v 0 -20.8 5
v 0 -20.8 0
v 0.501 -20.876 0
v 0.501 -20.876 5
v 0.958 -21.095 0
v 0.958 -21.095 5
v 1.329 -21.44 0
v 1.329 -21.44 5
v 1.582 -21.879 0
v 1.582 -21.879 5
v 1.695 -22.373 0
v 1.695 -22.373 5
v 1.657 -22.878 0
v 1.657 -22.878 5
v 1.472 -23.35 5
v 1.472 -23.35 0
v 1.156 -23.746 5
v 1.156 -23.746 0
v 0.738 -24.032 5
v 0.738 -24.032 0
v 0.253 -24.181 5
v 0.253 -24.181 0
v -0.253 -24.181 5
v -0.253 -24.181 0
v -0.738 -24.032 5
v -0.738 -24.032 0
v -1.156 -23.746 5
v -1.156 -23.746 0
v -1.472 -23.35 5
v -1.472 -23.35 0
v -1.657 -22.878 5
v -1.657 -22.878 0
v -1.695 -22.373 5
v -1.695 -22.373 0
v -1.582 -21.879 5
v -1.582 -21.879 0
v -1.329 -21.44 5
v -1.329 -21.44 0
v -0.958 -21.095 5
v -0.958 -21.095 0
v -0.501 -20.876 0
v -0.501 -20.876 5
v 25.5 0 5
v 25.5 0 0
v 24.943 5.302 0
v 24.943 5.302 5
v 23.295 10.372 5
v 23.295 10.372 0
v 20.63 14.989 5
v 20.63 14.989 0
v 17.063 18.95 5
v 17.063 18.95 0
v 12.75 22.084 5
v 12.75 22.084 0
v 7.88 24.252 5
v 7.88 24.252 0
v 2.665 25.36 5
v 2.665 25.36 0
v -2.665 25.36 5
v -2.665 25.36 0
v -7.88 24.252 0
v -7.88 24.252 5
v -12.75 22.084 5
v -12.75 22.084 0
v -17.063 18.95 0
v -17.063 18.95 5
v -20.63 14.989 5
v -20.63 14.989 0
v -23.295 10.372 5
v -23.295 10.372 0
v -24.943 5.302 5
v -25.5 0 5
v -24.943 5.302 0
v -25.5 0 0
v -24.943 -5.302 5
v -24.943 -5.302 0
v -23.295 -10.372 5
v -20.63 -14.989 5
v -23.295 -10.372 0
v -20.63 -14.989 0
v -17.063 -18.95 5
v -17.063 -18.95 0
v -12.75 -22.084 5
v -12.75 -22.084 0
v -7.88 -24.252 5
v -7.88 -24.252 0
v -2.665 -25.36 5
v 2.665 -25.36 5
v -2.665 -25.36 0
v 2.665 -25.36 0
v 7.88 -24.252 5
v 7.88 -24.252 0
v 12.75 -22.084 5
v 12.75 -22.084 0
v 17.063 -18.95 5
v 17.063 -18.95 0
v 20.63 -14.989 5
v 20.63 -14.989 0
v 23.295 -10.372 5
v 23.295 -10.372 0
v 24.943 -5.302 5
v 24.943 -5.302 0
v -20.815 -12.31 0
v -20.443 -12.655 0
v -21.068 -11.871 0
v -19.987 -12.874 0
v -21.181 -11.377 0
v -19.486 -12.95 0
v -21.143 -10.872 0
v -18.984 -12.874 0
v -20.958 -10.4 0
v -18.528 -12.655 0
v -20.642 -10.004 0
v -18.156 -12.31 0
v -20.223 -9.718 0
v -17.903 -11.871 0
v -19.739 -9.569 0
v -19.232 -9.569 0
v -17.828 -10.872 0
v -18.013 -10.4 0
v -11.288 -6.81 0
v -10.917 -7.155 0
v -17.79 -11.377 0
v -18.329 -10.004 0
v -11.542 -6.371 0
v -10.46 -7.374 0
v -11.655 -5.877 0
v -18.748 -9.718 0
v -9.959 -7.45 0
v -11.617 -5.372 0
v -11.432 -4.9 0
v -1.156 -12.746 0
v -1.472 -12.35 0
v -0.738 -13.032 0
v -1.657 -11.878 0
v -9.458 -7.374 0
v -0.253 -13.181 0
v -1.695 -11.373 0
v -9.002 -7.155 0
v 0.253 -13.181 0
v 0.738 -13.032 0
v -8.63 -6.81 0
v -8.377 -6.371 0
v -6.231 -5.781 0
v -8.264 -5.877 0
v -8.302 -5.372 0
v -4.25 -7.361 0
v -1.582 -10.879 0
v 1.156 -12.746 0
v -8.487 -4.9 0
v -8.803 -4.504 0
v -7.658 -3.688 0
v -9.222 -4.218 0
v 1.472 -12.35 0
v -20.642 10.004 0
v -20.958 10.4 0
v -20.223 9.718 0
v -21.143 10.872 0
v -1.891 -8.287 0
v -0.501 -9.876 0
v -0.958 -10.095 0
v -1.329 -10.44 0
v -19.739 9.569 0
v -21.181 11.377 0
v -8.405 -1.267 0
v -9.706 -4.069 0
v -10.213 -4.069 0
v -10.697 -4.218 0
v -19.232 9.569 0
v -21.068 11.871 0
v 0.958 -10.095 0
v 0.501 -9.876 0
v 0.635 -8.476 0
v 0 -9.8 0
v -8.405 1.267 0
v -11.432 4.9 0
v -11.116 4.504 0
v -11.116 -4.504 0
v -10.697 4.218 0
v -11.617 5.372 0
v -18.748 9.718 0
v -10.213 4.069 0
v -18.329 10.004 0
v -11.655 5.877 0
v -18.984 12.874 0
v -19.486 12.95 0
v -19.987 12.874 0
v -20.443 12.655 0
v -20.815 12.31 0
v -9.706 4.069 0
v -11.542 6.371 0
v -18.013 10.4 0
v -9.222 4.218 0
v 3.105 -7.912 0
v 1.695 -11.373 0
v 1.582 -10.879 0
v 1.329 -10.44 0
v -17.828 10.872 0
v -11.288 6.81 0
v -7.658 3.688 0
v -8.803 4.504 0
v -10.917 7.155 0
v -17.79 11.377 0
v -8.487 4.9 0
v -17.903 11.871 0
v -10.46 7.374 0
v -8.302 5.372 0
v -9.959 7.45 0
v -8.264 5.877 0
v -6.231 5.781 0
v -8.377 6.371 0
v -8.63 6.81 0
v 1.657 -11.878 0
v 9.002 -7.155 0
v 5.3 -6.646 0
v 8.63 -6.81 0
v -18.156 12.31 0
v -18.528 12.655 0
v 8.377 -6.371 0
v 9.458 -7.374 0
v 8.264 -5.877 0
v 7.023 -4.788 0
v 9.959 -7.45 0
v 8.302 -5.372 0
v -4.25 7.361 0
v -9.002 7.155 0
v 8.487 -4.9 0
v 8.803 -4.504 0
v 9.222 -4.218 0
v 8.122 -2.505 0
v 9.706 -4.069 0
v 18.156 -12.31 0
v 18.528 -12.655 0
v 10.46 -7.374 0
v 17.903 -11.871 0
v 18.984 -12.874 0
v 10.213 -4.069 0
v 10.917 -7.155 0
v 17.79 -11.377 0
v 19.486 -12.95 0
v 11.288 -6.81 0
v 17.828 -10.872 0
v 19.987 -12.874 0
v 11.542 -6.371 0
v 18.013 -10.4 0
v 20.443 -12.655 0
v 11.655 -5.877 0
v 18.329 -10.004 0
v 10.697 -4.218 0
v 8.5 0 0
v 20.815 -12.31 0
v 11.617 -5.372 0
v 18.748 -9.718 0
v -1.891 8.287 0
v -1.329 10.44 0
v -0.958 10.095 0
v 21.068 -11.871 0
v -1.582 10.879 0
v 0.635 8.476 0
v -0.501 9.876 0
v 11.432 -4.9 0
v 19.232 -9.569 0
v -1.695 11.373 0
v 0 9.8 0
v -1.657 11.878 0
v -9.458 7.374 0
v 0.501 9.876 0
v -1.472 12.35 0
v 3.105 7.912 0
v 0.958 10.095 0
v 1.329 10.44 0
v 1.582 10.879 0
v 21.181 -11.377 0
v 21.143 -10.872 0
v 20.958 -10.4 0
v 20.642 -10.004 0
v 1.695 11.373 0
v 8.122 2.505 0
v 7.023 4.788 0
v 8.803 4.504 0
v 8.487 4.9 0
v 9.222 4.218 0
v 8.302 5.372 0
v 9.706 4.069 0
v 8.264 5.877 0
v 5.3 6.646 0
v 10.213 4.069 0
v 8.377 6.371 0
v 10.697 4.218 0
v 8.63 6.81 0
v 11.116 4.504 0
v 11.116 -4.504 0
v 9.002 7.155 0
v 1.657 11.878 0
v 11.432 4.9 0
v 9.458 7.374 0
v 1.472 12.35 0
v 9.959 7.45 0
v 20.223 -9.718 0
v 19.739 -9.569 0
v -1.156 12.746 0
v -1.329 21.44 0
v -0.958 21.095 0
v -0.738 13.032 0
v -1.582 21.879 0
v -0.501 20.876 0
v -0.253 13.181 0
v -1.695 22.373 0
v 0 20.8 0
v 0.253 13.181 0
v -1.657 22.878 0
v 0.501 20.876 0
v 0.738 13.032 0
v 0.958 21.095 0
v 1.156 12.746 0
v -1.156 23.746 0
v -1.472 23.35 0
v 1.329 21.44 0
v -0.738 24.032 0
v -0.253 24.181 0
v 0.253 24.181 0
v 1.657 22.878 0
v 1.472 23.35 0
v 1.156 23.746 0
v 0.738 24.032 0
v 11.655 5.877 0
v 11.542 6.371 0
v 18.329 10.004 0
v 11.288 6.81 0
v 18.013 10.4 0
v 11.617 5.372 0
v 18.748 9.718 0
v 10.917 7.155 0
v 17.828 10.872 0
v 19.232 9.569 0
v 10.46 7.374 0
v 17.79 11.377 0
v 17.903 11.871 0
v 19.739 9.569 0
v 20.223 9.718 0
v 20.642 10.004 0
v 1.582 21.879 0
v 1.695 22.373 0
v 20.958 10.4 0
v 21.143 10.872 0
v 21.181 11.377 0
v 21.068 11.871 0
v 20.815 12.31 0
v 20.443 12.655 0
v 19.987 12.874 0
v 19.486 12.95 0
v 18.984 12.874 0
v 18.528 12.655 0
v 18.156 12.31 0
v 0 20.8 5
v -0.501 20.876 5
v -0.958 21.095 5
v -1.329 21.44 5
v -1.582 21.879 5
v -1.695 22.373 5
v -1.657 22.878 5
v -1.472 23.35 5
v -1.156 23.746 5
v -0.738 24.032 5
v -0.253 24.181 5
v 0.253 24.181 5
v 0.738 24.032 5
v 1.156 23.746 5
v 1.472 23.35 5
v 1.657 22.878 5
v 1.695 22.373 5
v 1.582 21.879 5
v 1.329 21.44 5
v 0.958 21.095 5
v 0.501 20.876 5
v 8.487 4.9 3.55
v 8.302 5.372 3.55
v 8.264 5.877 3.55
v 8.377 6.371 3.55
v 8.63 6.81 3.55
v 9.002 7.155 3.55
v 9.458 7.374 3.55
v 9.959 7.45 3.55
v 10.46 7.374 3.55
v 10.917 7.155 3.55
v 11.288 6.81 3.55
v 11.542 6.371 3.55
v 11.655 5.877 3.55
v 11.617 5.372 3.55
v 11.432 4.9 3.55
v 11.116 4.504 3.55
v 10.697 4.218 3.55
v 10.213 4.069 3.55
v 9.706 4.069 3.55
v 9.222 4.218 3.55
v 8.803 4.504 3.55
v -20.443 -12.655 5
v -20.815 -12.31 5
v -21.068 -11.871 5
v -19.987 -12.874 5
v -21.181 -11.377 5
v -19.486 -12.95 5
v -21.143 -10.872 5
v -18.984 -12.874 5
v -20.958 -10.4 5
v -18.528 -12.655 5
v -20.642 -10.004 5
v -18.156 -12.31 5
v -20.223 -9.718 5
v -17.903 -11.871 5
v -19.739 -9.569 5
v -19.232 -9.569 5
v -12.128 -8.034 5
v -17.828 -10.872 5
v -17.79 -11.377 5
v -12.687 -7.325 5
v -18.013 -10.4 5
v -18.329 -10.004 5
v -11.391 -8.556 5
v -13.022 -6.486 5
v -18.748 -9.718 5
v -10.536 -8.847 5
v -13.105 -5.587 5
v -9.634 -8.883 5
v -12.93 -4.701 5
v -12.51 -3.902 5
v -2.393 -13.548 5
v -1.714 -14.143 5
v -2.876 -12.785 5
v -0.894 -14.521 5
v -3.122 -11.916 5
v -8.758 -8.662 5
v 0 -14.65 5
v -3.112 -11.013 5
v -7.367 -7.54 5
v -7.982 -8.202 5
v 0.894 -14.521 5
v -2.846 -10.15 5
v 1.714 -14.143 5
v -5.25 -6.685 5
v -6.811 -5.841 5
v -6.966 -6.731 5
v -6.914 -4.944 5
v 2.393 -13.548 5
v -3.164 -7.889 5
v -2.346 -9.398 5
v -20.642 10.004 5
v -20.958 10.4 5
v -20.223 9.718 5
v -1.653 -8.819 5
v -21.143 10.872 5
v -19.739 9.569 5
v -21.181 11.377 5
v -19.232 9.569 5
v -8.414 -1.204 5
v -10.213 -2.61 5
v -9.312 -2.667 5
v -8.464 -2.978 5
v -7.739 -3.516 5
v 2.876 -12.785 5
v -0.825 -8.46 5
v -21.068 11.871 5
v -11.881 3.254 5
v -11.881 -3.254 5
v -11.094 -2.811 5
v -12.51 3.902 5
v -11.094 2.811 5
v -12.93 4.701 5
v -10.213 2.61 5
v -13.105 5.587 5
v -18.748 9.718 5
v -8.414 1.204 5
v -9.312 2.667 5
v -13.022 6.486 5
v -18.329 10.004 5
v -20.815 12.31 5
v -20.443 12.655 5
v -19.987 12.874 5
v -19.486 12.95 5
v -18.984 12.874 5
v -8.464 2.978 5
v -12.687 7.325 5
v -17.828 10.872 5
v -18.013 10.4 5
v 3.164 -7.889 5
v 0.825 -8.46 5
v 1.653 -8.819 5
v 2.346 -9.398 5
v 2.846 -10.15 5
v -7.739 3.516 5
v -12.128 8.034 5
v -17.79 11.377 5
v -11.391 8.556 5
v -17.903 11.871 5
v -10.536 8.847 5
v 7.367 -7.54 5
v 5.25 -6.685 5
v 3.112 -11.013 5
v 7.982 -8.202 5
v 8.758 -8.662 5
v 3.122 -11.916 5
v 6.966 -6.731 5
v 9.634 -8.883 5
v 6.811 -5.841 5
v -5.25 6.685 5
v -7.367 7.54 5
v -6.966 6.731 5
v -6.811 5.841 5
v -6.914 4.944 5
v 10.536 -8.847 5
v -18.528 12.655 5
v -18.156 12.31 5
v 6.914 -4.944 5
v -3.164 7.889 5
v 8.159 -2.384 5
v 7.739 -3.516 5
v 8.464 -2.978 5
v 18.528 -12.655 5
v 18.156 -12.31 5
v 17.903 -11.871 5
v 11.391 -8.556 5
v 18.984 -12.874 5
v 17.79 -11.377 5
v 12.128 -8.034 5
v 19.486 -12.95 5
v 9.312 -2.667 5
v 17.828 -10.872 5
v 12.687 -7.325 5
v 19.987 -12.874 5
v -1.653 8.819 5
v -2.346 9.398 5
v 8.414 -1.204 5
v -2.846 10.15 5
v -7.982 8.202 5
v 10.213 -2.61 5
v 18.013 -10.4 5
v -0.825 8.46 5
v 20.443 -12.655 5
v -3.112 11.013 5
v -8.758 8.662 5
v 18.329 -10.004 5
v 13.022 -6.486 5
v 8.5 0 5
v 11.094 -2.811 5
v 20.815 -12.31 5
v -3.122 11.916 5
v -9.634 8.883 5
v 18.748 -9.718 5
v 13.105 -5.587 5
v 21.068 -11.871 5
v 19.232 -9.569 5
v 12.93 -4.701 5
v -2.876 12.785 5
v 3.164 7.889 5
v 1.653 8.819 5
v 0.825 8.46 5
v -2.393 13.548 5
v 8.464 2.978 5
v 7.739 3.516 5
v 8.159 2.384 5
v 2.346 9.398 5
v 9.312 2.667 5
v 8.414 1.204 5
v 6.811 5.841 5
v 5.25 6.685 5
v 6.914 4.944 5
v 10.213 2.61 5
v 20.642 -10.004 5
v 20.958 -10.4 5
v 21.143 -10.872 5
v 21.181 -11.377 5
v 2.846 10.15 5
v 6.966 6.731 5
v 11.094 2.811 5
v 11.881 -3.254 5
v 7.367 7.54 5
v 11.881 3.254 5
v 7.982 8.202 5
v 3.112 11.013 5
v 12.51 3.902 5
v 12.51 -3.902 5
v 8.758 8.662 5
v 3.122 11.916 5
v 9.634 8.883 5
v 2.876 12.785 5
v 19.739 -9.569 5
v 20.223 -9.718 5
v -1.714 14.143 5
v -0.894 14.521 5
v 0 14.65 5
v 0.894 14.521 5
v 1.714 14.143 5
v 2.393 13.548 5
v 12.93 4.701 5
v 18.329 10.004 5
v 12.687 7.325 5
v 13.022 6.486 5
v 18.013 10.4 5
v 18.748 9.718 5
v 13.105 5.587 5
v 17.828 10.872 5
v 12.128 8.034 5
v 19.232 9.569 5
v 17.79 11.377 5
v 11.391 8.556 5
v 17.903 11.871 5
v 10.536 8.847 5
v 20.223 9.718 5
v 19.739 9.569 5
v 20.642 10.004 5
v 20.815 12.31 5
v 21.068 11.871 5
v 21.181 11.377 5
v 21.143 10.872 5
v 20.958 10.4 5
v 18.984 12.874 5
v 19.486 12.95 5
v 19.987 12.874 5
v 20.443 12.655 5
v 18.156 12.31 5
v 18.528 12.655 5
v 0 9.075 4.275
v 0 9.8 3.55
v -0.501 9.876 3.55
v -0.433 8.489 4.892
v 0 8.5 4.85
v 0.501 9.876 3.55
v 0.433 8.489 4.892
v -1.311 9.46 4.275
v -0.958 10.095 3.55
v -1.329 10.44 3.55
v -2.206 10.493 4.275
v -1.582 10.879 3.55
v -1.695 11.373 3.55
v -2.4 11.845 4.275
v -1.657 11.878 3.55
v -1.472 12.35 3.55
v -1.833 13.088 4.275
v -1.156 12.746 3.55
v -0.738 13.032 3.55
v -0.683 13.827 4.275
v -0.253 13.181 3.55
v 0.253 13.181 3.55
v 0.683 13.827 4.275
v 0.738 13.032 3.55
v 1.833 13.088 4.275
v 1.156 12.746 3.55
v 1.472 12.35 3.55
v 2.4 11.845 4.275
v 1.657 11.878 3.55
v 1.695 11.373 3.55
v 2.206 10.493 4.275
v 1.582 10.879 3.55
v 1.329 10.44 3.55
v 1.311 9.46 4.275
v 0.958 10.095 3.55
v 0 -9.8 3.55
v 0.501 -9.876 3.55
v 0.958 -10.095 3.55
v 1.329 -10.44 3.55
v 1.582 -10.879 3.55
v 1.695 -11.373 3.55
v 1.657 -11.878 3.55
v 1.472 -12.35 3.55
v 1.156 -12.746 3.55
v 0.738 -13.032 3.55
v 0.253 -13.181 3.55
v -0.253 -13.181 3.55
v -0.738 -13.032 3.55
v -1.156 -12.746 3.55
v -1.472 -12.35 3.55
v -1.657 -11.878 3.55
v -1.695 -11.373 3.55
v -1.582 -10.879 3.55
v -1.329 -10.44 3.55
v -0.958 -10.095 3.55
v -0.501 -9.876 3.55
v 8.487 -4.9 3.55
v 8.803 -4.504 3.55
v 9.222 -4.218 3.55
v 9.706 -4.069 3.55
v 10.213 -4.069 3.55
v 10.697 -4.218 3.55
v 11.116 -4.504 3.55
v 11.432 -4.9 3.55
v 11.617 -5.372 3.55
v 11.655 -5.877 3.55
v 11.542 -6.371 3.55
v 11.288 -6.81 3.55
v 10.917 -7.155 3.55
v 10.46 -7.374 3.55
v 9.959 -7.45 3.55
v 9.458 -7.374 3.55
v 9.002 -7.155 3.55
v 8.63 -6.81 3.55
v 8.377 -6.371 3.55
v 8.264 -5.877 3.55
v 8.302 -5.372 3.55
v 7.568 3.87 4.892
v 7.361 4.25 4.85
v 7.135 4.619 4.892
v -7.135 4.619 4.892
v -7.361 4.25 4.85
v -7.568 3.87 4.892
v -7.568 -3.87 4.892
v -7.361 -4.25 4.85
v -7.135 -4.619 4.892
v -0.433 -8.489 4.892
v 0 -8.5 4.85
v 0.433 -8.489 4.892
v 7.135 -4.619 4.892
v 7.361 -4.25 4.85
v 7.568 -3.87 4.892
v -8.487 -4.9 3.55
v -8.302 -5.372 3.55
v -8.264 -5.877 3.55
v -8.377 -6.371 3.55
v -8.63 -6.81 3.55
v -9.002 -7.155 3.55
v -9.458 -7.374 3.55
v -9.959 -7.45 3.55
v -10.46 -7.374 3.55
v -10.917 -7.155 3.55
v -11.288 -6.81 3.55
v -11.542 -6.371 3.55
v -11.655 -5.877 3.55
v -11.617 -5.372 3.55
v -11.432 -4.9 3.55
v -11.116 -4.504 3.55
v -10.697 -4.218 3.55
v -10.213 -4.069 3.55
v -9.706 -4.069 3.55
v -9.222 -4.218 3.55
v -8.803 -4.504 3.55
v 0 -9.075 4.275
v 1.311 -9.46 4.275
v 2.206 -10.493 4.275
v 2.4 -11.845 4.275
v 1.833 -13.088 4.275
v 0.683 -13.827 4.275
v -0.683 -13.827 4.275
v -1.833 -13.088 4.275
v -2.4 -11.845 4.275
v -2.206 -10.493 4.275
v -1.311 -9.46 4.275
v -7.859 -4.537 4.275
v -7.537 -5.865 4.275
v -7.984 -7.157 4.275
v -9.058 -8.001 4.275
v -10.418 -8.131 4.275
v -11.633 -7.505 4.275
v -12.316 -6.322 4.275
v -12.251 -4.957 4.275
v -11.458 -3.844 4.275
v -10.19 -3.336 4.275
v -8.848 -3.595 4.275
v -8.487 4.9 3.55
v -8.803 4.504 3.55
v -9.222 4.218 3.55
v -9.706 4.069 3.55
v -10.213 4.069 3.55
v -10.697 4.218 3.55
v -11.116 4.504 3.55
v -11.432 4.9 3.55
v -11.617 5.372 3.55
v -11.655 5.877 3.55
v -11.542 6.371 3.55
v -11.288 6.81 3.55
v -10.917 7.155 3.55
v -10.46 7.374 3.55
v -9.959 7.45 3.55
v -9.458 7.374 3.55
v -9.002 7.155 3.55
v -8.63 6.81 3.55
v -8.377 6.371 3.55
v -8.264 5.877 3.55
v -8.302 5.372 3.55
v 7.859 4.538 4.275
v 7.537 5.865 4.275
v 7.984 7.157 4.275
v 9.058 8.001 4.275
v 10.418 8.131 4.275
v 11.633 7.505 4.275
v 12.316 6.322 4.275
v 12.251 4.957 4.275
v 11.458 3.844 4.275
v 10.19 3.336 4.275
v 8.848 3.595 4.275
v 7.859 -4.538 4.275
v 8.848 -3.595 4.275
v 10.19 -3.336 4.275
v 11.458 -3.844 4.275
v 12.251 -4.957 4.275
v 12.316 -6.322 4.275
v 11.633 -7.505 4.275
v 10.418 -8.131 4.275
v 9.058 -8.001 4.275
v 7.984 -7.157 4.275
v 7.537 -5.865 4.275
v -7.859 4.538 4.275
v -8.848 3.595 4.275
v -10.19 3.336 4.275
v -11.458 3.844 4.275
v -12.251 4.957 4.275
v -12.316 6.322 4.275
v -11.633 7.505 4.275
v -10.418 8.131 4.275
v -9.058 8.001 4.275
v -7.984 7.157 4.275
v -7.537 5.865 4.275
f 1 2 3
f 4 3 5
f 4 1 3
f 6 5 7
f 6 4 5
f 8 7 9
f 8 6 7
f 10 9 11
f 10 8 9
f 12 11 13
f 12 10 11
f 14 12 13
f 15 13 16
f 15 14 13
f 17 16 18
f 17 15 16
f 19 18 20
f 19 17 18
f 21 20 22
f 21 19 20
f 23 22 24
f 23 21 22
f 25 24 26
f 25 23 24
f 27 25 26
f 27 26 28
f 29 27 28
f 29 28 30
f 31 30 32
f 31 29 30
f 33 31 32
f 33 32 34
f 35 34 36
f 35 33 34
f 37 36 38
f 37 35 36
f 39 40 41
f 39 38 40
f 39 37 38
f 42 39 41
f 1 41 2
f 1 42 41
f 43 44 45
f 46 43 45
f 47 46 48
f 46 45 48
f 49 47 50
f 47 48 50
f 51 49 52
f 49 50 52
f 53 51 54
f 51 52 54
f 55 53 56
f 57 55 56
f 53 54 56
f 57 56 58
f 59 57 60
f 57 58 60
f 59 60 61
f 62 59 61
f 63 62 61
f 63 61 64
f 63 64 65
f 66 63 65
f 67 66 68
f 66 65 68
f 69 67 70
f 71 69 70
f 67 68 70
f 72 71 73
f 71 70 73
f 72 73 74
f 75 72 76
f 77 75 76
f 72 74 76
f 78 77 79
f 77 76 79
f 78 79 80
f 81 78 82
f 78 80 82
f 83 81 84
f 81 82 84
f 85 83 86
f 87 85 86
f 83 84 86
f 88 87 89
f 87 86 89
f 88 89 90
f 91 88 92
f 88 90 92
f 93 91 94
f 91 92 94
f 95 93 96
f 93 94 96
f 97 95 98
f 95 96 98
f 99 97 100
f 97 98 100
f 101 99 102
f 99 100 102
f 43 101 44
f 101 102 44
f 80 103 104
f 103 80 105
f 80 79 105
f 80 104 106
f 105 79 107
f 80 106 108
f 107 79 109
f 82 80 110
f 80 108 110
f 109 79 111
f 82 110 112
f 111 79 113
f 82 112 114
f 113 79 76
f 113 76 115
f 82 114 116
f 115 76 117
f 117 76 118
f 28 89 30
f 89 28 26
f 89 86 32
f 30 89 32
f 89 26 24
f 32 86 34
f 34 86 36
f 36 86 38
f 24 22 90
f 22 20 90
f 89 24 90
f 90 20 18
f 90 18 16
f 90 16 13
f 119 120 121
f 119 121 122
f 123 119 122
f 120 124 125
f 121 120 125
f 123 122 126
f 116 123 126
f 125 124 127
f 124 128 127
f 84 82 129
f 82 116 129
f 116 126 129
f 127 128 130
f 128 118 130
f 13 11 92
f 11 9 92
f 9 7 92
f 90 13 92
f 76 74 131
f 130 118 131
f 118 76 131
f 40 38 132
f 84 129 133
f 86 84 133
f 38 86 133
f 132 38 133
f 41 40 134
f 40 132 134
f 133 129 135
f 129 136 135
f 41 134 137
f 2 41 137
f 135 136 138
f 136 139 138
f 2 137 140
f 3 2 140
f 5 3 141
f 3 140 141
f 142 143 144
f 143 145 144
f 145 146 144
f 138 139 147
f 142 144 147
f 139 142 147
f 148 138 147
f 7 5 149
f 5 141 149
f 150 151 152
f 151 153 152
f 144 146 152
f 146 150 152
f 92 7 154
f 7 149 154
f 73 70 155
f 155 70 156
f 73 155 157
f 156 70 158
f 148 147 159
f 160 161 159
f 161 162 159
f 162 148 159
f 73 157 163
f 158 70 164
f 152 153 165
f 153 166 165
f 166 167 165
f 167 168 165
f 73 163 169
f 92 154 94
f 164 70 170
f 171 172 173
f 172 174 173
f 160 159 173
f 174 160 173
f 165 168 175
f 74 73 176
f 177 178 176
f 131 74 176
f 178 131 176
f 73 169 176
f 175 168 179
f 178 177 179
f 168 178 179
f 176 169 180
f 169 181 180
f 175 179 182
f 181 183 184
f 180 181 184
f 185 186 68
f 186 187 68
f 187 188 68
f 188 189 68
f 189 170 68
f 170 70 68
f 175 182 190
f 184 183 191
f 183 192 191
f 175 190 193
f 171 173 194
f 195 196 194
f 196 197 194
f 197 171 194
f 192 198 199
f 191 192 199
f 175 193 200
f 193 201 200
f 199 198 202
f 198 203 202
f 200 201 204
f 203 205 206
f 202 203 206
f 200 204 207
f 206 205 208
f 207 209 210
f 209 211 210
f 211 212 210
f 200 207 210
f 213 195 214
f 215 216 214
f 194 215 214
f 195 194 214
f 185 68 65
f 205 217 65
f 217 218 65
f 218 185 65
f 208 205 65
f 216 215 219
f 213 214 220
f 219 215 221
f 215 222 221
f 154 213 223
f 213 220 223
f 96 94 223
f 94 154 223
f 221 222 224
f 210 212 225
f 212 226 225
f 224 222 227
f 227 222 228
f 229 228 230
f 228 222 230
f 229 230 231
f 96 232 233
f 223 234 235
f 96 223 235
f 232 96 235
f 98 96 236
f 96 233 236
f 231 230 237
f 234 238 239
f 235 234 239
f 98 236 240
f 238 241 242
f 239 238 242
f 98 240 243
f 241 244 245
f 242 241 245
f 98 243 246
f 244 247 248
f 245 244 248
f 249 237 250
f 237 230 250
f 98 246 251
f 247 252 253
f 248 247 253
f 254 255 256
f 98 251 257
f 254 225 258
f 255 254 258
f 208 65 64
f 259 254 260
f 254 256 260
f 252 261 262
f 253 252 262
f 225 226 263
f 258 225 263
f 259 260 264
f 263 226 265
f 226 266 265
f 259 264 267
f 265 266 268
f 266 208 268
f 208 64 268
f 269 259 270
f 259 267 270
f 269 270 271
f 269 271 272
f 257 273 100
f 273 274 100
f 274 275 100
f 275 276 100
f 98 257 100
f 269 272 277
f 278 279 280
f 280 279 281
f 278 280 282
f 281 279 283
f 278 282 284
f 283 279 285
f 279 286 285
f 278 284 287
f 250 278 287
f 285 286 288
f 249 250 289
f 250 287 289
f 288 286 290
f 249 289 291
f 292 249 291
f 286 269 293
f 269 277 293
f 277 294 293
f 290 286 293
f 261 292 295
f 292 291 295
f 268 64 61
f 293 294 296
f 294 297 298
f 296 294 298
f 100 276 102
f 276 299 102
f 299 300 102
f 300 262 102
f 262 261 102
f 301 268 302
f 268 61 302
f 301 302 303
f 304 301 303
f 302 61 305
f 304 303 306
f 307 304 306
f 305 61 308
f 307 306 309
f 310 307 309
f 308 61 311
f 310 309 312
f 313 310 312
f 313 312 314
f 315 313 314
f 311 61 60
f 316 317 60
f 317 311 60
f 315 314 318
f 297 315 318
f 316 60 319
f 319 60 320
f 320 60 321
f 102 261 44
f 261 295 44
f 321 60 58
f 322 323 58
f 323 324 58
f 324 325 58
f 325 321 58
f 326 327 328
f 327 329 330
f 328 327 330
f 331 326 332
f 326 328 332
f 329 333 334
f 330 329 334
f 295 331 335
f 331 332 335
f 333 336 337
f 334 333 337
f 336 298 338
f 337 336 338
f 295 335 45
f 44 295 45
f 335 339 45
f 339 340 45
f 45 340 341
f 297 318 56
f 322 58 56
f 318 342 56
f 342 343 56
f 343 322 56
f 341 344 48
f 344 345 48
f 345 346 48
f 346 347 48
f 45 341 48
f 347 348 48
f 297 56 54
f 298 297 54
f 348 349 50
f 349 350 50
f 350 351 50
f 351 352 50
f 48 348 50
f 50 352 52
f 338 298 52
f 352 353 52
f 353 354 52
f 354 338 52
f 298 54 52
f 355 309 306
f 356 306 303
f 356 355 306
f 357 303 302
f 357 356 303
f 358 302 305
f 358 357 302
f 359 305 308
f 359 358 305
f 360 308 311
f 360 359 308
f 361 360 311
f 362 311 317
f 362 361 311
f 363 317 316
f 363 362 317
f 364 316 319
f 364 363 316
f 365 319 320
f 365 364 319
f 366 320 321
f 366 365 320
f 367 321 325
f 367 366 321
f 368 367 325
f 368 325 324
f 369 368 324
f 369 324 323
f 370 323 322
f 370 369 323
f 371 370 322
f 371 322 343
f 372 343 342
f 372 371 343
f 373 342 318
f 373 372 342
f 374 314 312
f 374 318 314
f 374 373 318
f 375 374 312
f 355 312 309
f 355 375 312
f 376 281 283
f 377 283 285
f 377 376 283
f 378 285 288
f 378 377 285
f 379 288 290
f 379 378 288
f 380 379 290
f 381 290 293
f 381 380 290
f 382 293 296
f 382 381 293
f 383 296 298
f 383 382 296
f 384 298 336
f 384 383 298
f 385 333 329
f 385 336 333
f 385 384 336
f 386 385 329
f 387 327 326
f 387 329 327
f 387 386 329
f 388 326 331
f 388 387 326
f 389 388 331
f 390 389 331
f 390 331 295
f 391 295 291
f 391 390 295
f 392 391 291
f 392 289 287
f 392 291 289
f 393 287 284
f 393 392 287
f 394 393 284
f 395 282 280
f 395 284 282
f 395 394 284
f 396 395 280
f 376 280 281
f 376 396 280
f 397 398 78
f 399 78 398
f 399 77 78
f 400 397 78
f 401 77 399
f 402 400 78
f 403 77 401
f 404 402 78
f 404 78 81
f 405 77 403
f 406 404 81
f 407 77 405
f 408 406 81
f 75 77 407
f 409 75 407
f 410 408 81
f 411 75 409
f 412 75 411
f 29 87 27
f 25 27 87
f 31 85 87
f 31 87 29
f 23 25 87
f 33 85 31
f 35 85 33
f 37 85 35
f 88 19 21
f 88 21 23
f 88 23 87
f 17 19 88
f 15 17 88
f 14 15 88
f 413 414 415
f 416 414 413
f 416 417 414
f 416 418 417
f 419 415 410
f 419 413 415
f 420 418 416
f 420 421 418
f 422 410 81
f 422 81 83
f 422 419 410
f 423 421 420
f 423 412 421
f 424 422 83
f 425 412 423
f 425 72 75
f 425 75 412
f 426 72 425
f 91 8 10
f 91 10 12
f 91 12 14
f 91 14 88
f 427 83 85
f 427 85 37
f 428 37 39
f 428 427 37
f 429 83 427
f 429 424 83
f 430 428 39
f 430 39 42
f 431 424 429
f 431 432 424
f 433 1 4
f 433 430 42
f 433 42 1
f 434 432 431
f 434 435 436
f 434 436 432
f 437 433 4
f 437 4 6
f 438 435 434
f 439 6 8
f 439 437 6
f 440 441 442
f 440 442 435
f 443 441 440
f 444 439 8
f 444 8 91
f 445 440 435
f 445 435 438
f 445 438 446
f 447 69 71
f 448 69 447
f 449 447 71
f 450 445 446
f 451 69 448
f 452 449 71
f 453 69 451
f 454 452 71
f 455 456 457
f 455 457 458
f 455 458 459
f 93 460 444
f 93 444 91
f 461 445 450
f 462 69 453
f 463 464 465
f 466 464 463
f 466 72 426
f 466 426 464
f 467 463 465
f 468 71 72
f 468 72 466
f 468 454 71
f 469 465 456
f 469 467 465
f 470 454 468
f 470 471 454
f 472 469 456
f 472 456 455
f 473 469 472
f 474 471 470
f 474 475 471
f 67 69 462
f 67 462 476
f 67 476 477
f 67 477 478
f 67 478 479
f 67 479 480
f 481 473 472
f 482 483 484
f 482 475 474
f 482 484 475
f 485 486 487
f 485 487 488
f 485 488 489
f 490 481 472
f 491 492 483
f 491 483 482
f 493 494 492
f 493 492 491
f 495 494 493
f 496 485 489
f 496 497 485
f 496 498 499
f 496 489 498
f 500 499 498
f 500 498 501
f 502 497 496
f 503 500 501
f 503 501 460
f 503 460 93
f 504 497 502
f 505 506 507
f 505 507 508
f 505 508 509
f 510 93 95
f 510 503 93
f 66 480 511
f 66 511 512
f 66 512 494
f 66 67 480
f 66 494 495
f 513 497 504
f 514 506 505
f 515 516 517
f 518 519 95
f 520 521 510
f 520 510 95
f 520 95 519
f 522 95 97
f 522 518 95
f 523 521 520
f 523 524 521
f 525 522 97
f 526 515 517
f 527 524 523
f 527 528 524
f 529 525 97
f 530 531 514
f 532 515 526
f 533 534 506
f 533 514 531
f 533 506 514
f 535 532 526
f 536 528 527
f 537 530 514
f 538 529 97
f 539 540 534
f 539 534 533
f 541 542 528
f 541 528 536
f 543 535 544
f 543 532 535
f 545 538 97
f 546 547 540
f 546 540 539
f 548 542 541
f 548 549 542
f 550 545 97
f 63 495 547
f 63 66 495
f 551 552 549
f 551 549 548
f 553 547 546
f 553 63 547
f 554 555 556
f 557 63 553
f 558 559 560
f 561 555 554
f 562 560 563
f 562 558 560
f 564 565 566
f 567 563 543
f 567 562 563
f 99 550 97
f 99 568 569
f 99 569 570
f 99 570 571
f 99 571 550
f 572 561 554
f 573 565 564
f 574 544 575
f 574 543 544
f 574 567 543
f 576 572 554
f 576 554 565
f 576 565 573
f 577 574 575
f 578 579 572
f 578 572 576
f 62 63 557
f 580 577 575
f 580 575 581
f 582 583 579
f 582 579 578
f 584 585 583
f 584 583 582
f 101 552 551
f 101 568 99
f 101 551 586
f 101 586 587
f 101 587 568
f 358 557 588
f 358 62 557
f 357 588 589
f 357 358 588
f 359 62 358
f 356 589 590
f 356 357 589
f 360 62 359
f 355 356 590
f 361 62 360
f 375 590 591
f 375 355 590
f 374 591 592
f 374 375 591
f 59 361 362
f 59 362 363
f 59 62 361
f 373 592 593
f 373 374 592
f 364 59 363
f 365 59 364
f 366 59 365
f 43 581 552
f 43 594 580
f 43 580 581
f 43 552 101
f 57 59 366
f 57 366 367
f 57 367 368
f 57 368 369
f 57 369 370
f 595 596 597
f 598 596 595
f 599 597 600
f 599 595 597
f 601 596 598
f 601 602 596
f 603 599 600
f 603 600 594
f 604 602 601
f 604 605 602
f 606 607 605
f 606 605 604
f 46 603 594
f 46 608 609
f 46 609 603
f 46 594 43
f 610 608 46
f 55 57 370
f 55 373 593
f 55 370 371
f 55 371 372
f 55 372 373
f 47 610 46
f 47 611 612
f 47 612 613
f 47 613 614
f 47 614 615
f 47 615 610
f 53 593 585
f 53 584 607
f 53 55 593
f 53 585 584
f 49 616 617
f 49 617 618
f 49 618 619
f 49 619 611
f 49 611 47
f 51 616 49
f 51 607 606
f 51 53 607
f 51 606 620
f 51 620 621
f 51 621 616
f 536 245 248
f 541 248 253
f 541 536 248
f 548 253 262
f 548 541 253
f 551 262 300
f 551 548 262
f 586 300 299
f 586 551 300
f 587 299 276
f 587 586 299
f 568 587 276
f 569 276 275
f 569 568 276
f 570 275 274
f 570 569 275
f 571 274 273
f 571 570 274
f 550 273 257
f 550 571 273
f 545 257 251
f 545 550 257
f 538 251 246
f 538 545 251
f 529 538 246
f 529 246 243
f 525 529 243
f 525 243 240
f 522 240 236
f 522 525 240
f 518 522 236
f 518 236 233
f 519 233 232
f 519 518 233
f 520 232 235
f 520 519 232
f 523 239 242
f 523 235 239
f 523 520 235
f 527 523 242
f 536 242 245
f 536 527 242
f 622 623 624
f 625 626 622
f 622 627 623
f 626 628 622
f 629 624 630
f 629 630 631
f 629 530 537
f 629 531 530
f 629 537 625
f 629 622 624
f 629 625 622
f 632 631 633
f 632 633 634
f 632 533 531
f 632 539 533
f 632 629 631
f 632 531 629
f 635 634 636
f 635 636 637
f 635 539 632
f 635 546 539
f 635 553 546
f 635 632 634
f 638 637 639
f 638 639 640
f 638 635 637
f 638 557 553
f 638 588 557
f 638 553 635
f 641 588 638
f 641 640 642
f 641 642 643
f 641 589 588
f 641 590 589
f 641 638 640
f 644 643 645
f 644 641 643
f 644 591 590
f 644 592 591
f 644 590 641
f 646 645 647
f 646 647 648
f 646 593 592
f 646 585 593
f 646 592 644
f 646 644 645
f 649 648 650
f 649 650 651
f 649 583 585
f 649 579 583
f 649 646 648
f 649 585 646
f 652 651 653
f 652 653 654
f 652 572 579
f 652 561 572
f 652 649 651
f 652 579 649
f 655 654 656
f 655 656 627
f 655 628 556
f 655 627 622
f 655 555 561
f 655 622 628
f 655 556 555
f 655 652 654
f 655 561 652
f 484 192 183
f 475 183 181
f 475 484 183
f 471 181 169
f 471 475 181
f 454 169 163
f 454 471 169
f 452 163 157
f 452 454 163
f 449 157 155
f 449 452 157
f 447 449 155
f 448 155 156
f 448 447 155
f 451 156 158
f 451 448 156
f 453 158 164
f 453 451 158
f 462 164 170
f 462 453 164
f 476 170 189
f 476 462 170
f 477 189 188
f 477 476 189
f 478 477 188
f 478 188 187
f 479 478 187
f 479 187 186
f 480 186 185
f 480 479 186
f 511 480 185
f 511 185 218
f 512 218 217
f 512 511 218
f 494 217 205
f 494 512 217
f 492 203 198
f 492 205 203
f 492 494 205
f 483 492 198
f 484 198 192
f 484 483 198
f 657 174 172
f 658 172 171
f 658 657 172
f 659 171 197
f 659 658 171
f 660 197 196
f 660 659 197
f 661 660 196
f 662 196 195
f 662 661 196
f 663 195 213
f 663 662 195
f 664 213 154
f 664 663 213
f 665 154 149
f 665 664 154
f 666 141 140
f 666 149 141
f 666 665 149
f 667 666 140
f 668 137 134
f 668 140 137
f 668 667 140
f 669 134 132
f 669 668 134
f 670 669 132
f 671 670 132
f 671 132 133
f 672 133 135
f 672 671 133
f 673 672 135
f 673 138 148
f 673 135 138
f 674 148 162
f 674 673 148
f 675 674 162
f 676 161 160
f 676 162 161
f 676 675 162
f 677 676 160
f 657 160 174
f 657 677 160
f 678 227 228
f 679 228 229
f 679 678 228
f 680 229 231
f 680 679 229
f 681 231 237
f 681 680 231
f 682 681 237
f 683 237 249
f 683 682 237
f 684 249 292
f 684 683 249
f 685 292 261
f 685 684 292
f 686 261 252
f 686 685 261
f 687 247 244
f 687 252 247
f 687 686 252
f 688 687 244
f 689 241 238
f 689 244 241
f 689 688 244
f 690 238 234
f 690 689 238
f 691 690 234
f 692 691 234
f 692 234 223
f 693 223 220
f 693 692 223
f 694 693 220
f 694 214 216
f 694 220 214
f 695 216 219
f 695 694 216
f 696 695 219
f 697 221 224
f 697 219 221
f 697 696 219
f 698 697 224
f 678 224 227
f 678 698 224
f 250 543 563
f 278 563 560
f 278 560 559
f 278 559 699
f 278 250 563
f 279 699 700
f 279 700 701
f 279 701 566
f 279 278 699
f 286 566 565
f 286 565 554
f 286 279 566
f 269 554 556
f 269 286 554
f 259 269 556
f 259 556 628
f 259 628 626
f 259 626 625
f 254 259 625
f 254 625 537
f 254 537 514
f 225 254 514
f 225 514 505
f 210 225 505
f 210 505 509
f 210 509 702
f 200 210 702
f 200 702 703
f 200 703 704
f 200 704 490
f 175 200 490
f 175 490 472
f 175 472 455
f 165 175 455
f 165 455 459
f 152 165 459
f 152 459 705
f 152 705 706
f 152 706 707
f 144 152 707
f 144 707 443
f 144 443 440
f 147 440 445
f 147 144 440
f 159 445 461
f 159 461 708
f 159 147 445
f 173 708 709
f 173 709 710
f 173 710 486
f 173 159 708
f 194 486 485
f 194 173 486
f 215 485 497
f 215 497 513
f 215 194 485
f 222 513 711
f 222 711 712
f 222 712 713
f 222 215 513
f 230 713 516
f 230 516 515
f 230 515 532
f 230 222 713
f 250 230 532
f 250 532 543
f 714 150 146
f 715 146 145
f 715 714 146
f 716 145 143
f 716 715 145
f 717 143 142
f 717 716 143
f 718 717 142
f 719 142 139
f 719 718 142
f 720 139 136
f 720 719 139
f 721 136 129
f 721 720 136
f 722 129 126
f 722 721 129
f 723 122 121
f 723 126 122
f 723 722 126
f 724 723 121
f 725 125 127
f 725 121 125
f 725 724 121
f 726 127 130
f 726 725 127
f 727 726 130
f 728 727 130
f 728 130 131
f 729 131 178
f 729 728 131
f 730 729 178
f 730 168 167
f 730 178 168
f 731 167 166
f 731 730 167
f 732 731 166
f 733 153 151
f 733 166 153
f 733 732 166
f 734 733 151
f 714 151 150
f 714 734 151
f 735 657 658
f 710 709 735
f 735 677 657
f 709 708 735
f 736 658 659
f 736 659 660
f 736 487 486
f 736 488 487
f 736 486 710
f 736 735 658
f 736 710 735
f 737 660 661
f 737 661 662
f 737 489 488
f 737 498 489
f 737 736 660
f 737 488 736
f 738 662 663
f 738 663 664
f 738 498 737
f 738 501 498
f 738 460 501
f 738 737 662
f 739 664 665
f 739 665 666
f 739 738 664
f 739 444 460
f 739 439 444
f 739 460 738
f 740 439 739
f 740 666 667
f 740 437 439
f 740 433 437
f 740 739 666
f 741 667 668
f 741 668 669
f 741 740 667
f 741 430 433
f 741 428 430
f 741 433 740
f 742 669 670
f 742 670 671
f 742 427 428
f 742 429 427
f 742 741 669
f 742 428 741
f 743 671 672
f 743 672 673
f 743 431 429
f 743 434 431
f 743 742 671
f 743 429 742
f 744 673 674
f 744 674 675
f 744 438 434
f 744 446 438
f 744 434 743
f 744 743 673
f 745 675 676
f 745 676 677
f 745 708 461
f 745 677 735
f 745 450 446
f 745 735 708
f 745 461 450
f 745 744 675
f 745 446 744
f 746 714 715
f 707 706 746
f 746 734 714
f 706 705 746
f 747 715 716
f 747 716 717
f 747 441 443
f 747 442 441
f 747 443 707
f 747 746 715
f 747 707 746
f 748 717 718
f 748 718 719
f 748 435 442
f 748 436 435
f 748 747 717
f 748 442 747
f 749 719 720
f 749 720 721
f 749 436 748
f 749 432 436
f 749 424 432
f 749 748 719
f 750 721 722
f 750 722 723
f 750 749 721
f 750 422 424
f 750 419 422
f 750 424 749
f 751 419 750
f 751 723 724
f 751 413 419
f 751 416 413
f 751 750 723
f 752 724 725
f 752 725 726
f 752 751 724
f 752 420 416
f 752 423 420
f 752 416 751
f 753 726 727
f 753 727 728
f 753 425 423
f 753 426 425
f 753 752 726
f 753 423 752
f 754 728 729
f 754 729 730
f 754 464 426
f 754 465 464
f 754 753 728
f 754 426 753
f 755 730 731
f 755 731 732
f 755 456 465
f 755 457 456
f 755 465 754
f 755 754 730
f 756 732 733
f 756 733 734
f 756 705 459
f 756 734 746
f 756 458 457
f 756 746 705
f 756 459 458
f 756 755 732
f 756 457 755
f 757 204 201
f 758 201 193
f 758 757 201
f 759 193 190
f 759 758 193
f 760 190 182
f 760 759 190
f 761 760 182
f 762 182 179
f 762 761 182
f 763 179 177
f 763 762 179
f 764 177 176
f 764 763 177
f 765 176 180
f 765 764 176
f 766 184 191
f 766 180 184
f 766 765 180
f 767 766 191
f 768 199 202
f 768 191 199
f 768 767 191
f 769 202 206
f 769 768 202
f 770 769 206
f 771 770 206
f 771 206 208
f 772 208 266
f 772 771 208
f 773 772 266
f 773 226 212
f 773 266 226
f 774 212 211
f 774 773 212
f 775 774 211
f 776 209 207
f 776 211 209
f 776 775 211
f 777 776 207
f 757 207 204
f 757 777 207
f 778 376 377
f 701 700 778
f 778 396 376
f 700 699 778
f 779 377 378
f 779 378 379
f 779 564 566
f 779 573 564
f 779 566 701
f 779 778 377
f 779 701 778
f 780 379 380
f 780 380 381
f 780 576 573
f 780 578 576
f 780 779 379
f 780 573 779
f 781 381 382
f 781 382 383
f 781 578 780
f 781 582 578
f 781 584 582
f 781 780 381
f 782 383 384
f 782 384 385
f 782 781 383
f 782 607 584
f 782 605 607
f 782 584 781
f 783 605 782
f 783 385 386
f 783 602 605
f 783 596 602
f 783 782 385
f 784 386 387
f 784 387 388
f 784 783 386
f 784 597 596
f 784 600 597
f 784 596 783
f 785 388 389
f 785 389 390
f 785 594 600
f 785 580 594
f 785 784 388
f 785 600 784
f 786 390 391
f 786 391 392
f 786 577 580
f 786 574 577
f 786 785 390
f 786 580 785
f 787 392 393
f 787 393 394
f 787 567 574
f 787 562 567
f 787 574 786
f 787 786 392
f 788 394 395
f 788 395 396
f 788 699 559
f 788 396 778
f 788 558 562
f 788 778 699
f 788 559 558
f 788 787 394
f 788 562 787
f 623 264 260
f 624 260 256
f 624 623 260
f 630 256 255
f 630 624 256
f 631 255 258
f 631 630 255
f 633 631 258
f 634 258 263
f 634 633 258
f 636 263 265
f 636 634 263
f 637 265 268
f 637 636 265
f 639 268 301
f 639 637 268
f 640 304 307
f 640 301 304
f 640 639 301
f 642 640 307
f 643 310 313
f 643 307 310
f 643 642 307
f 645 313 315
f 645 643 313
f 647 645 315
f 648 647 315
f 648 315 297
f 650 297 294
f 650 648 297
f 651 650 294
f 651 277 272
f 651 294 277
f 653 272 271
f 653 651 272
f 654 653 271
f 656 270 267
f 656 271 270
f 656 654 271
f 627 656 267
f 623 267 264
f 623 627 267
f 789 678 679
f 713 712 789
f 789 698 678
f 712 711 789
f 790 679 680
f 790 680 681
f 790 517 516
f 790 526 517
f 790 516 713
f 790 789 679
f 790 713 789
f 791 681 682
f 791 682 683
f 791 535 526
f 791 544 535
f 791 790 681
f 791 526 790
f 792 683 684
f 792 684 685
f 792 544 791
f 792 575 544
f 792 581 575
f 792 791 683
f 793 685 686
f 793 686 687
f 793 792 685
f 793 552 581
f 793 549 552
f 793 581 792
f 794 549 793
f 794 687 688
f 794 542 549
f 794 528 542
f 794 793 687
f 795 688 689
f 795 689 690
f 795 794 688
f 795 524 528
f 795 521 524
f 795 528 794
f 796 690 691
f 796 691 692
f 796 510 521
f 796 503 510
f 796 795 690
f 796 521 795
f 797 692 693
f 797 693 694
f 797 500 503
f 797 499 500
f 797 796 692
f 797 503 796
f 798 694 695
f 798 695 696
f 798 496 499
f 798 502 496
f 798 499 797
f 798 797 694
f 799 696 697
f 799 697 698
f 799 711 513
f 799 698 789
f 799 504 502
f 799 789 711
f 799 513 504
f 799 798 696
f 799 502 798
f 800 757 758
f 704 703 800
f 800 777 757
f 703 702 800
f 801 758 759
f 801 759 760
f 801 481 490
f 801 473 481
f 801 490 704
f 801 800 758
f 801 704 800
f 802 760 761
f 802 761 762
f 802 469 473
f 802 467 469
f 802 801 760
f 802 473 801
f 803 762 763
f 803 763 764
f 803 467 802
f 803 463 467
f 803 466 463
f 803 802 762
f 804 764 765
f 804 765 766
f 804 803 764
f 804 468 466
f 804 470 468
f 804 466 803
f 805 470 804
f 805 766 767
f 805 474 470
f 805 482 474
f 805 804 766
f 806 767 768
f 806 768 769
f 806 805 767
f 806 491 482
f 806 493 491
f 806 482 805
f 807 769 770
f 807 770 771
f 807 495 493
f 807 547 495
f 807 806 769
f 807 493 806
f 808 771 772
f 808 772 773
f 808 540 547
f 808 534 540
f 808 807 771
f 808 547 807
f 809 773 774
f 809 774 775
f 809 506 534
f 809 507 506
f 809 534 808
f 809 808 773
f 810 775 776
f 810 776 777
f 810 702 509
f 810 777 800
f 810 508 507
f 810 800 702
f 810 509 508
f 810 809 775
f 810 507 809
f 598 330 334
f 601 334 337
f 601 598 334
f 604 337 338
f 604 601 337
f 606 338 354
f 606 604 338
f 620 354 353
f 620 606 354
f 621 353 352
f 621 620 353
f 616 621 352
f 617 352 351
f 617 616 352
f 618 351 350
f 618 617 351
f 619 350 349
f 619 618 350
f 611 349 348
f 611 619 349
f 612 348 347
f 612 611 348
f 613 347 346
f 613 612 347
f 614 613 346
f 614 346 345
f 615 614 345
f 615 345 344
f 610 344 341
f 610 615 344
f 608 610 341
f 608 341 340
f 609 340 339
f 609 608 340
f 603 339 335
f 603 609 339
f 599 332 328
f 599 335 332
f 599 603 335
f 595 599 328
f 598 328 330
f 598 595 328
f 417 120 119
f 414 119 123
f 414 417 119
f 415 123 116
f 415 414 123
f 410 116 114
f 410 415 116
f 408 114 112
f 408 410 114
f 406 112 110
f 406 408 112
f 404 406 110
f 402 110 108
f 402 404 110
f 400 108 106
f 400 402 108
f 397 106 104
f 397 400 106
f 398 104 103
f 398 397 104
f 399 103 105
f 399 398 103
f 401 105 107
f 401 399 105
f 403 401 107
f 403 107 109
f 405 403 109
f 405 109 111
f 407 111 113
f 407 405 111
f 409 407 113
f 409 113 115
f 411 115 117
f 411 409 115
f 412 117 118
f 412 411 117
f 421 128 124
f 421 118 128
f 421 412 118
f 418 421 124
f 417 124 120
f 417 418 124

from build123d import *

# Parameters (mm, degrees)
SKETCH1_R           = 25.5
SKETCH1_R_2         = 8.5
BOSS_EXTRUDE1_DEPTH = 5
CIRPATTERN1_COUNT   = 6


with BuildPart() as part:
    # Sketch1 → Boss-Extrude1 (new body)
    with BuildSketch(Plane.XY):
        Circle(SKETCH1_R)
        Circle(SKETCH1_R_2, mode=Mode.SUBTRACT)
    extrude(amount=BOSS_EXTRUDE1_DEPTH)

    # Sketch3 → M3 Clearance Hole1 (revolve, cut)
    with BuildSketch(Plane(origin=(0, 22.5, 5), x_dir=(0, -1, 0), z_dir=(1, 0, 0))):
        Polygon((0, 0), (0, 11.021463052), (1.7, 10), (1.7, 0), align=None)
    m3_clearance_hole1 = revolve(axis=Axis((0, 22.5, 11.35), (0, 0, -1)), mode=Mode.SUBTRACT)

    # Sketch5 → CSK for M3 Countersunk Flat Head Screw3 (revolve, cut)
    with BuildSketch(Plane(origin=(0, 11.5, 5), x_dir=(0, -1, 0), z_dir=(1, 0, 0))):
        Polygon((0, 0), (0, 11.021463052), (1.7, 10), (1.7, 1.45), (3.15, 0), align=None)
    csk_for_m3_countersunk_flat_head_screw3 = revolve(axis=Axis((0, 11.5, 11.35), (0, 0, -1)), mode=Mode.SUBTRACT)

    # CirPattern1: M3 Clearance Hole1, CSK for M3 Countersunk Flat Head Screw3 ×6 about axis
    cirpattern1_axis = Axis((0, 0, 0), (0, 0, 1))
    for i in range(1, CIRPATTERN1_COUNT):
        add(m3_clearance_hole1.rotate(cirpattern1_axis, i * 360 / CIRPATTERN1_COUNT), mode=Mode.SUBTRACT)
        add(csk_for_m3_countersunk_flat_head_screw3.rotate(cirpattern1_axis, i * 360 / CIRPATTERN1_COUNT), mode=Mode.SUBTRACT)


solid = part.part
